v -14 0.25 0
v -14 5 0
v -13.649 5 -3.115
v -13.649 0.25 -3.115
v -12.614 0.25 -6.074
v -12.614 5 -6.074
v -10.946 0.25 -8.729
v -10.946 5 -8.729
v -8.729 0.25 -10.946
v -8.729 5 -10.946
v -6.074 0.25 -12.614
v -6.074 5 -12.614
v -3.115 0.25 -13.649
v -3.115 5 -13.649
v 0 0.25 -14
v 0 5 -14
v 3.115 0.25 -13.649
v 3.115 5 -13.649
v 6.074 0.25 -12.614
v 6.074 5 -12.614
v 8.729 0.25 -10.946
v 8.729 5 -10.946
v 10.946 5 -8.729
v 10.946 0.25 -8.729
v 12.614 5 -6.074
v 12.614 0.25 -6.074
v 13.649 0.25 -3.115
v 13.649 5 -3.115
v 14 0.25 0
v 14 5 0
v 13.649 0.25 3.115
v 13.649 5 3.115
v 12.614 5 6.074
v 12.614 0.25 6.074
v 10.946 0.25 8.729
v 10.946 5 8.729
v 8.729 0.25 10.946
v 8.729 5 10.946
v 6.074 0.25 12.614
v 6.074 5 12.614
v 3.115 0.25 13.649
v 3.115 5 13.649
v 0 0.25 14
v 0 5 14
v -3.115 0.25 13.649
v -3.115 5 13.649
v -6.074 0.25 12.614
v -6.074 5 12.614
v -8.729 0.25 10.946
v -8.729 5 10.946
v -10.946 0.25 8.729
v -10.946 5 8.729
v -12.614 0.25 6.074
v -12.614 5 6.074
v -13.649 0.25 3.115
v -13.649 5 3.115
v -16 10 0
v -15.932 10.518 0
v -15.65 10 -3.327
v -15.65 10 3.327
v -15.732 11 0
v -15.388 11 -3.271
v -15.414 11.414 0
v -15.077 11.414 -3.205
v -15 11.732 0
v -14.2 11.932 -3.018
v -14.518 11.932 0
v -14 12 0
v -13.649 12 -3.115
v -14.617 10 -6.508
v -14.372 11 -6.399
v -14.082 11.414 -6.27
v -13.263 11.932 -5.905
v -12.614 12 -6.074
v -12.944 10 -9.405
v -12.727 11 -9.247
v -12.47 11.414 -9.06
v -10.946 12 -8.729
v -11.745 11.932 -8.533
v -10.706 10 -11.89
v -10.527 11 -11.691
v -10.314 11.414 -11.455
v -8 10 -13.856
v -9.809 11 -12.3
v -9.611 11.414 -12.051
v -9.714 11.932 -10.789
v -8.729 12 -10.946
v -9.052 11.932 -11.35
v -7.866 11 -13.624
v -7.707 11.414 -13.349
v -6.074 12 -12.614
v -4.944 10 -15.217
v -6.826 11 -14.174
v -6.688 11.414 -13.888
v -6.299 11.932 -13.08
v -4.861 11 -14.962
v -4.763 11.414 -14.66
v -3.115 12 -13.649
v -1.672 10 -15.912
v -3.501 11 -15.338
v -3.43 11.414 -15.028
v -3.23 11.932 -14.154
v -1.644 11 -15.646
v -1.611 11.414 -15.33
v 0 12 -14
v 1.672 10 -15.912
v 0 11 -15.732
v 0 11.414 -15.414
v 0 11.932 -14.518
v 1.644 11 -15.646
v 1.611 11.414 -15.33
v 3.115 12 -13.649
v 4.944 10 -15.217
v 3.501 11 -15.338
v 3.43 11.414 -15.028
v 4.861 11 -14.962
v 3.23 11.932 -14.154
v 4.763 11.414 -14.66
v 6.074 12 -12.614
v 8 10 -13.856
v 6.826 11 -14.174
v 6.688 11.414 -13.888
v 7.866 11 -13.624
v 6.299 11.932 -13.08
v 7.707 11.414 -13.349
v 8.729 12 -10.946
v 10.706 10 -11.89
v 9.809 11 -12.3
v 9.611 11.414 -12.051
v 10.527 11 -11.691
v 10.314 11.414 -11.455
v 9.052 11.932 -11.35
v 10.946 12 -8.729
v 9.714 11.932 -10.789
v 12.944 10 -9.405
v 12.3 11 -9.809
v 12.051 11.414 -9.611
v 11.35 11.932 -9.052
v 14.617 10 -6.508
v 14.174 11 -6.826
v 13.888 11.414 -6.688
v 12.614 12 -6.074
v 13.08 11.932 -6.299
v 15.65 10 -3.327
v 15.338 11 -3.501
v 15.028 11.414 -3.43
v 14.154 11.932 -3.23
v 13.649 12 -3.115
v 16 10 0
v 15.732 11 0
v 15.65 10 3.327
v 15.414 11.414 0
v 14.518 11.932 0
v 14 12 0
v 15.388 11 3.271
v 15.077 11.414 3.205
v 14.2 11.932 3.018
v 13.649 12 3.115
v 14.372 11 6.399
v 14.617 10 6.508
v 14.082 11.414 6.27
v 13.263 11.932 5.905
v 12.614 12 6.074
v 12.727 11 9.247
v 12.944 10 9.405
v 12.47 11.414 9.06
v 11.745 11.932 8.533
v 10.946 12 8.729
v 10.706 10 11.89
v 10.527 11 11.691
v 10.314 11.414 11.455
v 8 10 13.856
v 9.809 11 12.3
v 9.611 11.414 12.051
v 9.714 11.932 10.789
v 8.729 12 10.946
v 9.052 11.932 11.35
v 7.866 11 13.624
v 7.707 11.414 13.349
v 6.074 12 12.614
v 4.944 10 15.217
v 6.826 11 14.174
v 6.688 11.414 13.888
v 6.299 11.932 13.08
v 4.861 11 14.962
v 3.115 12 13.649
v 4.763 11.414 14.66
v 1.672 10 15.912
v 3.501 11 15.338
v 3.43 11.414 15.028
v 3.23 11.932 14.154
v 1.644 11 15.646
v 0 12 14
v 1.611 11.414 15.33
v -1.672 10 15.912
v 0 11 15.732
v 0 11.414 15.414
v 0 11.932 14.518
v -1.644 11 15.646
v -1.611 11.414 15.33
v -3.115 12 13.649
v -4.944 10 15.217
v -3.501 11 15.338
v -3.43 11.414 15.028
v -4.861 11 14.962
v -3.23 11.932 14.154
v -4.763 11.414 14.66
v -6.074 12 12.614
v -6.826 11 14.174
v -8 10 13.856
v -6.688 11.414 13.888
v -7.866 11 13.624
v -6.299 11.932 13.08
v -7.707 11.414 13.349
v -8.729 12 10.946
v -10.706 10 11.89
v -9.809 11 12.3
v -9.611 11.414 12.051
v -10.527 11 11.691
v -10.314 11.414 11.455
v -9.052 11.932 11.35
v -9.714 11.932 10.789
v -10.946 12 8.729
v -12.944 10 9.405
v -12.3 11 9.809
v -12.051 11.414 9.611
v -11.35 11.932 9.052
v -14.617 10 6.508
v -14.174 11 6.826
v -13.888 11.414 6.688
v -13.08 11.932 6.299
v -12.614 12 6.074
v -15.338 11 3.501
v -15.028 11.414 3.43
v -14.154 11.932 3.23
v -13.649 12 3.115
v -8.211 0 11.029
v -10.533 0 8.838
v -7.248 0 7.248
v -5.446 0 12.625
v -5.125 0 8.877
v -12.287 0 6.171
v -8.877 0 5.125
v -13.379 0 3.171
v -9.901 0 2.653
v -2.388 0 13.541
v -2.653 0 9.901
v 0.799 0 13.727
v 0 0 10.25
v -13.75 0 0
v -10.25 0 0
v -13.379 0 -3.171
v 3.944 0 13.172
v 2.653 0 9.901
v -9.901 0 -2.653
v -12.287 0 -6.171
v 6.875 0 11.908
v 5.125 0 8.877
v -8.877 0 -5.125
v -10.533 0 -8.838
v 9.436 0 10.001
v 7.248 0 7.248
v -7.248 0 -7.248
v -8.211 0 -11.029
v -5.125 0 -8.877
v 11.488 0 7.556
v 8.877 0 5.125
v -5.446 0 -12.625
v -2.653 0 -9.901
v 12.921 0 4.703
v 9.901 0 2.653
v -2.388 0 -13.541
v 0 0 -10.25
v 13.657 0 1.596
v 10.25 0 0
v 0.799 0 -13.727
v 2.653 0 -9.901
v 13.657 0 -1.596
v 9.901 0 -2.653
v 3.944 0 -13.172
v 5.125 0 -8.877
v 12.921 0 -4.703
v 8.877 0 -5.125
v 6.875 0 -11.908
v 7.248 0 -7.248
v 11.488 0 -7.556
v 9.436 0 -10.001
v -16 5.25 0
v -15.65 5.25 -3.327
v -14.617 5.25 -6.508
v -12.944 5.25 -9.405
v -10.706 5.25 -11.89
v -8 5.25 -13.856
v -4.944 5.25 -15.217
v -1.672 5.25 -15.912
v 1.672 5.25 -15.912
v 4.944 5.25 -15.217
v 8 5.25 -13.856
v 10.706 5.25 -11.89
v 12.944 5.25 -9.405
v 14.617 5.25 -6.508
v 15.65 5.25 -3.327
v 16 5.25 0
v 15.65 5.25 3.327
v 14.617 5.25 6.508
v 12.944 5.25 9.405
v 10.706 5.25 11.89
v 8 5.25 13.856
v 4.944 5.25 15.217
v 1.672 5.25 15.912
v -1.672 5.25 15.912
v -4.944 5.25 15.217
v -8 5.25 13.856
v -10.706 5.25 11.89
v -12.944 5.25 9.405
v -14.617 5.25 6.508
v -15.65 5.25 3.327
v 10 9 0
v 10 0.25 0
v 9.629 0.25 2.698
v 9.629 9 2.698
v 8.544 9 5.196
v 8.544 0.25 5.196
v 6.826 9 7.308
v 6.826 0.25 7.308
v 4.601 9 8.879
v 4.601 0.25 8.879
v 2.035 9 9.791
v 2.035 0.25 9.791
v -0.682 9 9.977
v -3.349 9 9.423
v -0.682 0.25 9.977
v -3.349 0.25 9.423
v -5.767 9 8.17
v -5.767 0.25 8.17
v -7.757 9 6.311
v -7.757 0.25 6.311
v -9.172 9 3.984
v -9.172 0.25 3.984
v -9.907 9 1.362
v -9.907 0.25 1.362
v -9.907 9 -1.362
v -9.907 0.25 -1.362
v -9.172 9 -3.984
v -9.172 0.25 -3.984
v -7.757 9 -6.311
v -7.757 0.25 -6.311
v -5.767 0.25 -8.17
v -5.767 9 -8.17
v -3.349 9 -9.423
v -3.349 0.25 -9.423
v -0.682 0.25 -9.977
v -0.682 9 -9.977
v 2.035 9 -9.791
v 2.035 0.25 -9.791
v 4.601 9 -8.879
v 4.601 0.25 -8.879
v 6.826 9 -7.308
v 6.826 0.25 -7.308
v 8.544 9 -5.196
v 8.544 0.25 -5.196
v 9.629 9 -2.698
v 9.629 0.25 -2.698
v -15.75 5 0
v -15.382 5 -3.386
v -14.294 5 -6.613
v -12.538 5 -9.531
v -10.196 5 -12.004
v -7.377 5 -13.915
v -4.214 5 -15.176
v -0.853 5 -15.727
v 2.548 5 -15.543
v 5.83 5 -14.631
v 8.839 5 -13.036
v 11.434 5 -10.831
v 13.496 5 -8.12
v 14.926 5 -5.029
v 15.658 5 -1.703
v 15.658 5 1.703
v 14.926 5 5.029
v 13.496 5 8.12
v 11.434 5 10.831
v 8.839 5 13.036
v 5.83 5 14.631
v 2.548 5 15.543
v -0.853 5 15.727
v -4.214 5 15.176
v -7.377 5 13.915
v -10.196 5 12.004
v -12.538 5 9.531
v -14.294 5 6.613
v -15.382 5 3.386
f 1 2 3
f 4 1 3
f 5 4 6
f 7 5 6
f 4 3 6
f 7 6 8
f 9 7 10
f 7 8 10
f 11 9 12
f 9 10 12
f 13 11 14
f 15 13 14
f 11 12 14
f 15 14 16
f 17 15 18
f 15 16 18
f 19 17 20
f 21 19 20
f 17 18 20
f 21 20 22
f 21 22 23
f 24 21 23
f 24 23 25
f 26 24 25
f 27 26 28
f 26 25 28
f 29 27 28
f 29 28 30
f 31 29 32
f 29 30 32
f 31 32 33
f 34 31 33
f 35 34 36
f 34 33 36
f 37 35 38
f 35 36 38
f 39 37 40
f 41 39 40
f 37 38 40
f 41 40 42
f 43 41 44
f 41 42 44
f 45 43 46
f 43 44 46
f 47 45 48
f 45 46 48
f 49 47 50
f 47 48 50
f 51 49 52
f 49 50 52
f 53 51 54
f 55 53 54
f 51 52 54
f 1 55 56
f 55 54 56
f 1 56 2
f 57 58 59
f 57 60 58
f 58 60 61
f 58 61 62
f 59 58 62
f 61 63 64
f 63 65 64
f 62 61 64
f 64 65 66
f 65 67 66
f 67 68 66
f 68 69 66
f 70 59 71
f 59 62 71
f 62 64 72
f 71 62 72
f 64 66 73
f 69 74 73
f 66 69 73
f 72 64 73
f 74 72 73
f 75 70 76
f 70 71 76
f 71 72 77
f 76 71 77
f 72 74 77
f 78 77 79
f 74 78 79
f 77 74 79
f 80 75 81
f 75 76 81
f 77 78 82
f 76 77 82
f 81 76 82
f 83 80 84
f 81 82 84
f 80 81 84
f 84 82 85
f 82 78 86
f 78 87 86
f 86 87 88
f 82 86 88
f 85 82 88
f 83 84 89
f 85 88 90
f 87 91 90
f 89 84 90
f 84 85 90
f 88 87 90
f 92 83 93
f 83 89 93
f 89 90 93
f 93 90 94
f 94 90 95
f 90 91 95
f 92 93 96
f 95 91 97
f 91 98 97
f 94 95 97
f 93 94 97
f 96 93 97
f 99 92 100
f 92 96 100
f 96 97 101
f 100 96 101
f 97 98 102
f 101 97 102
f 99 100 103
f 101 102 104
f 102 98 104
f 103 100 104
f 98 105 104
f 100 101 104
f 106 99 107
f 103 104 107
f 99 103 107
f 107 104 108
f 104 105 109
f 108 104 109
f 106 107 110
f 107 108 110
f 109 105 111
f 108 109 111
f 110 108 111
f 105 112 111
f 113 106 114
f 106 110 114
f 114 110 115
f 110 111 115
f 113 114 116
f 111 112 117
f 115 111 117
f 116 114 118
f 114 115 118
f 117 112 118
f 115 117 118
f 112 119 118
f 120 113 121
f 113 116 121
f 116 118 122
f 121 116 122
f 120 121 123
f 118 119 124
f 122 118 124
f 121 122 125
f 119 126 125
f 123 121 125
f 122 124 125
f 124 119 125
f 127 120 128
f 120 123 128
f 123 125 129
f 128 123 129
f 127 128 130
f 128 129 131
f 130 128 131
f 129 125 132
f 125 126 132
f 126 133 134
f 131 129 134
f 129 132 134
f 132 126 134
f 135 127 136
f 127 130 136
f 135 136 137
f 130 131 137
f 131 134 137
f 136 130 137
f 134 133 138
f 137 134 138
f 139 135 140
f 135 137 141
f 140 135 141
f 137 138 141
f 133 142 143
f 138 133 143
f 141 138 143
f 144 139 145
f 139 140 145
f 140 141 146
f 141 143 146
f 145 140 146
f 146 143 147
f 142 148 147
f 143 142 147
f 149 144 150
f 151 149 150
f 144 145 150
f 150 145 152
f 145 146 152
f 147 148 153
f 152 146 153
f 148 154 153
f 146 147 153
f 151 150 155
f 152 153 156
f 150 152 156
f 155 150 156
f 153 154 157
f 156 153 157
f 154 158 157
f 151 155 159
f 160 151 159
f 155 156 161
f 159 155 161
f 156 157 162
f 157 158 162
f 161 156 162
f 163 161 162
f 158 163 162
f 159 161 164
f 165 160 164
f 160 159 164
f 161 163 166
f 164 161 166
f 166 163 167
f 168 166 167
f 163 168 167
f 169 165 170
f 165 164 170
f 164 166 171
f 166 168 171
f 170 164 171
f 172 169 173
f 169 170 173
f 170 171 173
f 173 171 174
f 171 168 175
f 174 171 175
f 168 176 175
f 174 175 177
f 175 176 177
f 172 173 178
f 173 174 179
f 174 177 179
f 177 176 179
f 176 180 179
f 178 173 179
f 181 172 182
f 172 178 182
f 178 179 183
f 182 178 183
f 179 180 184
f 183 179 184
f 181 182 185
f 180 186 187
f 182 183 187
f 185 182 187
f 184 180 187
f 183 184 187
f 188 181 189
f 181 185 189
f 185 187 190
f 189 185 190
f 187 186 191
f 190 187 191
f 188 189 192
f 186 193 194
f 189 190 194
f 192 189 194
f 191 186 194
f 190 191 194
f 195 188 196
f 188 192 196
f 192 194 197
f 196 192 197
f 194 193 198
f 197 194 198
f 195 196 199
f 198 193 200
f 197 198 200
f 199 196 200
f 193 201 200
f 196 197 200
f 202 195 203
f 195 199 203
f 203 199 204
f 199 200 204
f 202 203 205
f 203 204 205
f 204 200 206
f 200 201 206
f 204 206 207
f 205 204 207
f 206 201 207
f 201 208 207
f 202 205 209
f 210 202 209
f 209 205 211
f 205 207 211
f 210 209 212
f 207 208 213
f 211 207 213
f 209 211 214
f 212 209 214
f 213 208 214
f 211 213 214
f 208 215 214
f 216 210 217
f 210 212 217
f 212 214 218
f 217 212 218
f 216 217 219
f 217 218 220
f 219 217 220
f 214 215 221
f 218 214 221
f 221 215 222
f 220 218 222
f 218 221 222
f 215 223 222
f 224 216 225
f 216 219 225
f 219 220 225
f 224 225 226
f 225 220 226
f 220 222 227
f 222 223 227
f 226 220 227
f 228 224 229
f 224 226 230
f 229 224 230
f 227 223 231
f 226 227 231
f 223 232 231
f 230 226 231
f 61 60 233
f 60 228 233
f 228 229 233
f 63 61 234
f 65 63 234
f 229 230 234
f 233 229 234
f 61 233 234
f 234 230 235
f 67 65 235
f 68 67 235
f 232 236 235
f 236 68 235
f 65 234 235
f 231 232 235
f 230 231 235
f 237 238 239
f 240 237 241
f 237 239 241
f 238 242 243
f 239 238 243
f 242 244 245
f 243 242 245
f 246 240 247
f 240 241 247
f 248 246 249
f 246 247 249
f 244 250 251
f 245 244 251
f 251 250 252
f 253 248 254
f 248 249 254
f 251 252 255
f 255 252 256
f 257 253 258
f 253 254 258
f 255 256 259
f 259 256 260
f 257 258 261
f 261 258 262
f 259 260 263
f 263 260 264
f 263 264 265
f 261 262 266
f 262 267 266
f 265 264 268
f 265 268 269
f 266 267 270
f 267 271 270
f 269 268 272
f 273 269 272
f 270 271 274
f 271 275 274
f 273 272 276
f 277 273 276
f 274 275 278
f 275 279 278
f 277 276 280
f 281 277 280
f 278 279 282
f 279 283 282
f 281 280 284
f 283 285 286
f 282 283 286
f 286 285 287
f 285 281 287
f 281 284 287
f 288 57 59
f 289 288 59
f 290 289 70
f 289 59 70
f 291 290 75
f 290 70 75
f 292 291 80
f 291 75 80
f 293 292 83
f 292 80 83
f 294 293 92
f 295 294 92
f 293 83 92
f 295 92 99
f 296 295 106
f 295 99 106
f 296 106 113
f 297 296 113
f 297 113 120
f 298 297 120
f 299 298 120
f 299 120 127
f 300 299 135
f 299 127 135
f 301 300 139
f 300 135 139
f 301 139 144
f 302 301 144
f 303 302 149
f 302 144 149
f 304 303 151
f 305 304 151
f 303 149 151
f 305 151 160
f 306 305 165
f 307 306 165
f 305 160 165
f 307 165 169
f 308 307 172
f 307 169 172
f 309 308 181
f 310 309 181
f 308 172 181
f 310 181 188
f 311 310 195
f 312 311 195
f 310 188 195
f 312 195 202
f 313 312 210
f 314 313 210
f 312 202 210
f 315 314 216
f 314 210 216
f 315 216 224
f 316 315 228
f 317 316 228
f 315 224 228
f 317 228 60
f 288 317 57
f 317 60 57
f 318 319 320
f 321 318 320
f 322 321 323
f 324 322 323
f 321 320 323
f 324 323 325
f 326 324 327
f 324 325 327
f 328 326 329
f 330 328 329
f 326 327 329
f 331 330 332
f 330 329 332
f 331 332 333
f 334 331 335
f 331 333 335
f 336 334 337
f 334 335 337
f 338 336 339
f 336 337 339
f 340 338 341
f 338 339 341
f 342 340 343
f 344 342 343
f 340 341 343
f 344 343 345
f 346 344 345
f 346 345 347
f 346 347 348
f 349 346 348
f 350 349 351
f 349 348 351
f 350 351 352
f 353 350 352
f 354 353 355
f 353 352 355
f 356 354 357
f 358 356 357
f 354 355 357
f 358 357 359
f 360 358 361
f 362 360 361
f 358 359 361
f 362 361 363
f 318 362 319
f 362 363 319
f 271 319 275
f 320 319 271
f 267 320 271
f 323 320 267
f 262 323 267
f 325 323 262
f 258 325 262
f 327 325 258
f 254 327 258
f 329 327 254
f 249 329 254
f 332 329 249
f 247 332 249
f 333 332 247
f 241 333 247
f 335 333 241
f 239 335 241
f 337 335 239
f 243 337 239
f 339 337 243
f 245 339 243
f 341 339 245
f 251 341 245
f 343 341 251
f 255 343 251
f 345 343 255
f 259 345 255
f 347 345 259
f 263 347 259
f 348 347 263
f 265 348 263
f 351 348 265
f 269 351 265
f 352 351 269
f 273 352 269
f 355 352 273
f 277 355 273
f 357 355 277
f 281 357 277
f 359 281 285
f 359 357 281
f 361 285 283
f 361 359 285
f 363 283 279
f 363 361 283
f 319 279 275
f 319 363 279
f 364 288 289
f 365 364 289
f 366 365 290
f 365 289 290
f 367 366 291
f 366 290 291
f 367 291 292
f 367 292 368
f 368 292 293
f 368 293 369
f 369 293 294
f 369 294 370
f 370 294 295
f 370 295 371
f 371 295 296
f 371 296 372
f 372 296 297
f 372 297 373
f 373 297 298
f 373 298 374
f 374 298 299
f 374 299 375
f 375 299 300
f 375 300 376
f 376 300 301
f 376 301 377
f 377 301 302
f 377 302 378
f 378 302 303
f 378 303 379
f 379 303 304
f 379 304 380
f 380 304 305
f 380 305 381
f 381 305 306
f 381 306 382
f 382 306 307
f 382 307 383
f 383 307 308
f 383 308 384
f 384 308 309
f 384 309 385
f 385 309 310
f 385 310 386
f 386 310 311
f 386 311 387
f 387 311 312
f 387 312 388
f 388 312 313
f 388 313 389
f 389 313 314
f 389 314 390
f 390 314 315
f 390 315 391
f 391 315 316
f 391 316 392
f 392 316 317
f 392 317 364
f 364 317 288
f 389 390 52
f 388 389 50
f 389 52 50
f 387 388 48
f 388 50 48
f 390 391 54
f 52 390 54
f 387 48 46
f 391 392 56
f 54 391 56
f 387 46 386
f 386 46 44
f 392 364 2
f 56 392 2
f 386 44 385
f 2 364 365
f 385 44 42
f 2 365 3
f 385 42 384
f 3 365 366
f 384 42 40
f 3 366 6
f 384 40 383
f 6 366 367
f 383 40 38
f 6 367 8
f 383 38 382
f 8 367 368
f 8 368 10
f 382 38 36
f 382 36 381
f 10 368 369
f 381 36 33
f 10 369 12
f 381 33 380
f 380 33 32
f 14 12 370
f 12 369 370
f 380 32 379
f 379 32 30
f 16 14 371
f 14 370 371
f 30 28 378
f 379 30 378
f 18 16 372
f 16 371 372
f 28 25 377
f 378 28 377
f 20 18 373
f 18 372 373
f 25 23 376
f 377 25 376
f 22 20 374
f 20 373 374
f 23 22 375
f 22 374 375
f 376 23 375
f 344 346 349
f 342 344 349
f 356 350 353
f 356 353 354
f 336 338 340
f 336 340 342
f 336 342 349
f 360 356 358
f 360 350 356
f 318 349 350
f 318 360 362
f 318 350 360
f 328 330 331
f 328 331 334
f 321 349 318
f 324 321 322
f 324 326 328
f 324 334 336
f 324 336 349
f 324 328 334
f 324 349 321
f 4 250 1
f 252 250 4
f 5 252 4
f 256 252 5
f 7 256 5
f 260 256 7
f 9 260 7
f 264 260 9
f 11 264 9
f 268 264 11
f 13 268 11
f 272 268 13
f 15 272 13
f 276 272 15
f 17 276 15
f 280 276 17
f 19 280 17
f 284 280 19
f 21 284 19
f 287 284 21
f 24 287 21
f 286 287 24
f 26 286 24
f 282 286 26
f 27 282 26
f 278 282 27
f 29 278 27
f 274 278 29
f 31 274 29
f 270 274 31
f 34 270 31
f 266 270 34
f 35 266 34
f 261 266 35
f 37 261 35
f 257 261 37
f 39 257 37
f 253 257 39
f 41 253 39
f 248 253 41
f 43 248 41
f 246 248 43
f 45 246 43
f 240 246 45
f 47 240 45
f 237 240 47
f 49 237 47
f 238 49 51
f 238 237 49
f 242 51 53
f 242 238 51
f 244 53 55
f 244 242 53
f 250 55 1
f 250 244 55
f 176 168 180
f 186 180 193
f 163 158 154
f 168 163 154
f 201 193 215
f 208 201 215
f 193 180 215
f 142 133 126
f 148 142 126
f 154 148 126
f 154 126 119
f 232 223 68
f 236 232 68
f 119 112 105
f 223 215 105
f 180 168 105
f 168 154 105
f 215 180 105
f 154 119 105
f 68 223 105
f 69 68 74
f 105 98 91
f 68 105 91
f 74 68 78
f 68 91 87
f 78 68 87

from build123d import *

# Parameters (mm, degrees)
FILLET1_R          = 2
SKETCH2_R          = 10
CUT_EXTRUDE1_DEPTH = 9
CHAMFER1_SIZE      = 0.25
CHAMFER2_SIZE      = 0.25


with BuildPart() as part:
    # Sketch1 → Revolve1 (revolve)
    with BuildSketch(Plane.XY):
        Polygon((0, 0), (-14, 0), (-14, 5), (-16, 5), (-16, 12), (0, 12), align=None)
    revolve(axis=Axis((0, 12, 0), (0, -1, 0)))

    # Fillet1
    fillet1_edges = [part.edges().sort_by_distance(p)[0] for p in [
        (16, 12, 0),
    ]]
    fillet(fillet1_edges, radius=FILLET1_R)

    # Sketch2 → Cut-Extrude1 (cut)
    with BuildSketch(Plane.XZ):
        Circle(SKETCH2_R)
    extrude(amount=-CUT_EXTRUDE1_DEPTH, mode=Mode.SUBTRACT)

    # Chamfer1
    chamfer1_edges = [part.edges().sort_by_distance(p)[0] for p in [
        (-10, 0, 0),
        (14, 0, 0),
    ]]
    chamfer(chamfer1_edges, length=CHAMFER1_SIZE)

    # Chamfer2
    chamfer2_edges = [part.edges().sort_by_distance(p)[0] for p in [
        (16, 5, 0),
    ]]
    chamfer(chamfer2_edges, length=CHAMFER2_SIZE)


solid = part.part
